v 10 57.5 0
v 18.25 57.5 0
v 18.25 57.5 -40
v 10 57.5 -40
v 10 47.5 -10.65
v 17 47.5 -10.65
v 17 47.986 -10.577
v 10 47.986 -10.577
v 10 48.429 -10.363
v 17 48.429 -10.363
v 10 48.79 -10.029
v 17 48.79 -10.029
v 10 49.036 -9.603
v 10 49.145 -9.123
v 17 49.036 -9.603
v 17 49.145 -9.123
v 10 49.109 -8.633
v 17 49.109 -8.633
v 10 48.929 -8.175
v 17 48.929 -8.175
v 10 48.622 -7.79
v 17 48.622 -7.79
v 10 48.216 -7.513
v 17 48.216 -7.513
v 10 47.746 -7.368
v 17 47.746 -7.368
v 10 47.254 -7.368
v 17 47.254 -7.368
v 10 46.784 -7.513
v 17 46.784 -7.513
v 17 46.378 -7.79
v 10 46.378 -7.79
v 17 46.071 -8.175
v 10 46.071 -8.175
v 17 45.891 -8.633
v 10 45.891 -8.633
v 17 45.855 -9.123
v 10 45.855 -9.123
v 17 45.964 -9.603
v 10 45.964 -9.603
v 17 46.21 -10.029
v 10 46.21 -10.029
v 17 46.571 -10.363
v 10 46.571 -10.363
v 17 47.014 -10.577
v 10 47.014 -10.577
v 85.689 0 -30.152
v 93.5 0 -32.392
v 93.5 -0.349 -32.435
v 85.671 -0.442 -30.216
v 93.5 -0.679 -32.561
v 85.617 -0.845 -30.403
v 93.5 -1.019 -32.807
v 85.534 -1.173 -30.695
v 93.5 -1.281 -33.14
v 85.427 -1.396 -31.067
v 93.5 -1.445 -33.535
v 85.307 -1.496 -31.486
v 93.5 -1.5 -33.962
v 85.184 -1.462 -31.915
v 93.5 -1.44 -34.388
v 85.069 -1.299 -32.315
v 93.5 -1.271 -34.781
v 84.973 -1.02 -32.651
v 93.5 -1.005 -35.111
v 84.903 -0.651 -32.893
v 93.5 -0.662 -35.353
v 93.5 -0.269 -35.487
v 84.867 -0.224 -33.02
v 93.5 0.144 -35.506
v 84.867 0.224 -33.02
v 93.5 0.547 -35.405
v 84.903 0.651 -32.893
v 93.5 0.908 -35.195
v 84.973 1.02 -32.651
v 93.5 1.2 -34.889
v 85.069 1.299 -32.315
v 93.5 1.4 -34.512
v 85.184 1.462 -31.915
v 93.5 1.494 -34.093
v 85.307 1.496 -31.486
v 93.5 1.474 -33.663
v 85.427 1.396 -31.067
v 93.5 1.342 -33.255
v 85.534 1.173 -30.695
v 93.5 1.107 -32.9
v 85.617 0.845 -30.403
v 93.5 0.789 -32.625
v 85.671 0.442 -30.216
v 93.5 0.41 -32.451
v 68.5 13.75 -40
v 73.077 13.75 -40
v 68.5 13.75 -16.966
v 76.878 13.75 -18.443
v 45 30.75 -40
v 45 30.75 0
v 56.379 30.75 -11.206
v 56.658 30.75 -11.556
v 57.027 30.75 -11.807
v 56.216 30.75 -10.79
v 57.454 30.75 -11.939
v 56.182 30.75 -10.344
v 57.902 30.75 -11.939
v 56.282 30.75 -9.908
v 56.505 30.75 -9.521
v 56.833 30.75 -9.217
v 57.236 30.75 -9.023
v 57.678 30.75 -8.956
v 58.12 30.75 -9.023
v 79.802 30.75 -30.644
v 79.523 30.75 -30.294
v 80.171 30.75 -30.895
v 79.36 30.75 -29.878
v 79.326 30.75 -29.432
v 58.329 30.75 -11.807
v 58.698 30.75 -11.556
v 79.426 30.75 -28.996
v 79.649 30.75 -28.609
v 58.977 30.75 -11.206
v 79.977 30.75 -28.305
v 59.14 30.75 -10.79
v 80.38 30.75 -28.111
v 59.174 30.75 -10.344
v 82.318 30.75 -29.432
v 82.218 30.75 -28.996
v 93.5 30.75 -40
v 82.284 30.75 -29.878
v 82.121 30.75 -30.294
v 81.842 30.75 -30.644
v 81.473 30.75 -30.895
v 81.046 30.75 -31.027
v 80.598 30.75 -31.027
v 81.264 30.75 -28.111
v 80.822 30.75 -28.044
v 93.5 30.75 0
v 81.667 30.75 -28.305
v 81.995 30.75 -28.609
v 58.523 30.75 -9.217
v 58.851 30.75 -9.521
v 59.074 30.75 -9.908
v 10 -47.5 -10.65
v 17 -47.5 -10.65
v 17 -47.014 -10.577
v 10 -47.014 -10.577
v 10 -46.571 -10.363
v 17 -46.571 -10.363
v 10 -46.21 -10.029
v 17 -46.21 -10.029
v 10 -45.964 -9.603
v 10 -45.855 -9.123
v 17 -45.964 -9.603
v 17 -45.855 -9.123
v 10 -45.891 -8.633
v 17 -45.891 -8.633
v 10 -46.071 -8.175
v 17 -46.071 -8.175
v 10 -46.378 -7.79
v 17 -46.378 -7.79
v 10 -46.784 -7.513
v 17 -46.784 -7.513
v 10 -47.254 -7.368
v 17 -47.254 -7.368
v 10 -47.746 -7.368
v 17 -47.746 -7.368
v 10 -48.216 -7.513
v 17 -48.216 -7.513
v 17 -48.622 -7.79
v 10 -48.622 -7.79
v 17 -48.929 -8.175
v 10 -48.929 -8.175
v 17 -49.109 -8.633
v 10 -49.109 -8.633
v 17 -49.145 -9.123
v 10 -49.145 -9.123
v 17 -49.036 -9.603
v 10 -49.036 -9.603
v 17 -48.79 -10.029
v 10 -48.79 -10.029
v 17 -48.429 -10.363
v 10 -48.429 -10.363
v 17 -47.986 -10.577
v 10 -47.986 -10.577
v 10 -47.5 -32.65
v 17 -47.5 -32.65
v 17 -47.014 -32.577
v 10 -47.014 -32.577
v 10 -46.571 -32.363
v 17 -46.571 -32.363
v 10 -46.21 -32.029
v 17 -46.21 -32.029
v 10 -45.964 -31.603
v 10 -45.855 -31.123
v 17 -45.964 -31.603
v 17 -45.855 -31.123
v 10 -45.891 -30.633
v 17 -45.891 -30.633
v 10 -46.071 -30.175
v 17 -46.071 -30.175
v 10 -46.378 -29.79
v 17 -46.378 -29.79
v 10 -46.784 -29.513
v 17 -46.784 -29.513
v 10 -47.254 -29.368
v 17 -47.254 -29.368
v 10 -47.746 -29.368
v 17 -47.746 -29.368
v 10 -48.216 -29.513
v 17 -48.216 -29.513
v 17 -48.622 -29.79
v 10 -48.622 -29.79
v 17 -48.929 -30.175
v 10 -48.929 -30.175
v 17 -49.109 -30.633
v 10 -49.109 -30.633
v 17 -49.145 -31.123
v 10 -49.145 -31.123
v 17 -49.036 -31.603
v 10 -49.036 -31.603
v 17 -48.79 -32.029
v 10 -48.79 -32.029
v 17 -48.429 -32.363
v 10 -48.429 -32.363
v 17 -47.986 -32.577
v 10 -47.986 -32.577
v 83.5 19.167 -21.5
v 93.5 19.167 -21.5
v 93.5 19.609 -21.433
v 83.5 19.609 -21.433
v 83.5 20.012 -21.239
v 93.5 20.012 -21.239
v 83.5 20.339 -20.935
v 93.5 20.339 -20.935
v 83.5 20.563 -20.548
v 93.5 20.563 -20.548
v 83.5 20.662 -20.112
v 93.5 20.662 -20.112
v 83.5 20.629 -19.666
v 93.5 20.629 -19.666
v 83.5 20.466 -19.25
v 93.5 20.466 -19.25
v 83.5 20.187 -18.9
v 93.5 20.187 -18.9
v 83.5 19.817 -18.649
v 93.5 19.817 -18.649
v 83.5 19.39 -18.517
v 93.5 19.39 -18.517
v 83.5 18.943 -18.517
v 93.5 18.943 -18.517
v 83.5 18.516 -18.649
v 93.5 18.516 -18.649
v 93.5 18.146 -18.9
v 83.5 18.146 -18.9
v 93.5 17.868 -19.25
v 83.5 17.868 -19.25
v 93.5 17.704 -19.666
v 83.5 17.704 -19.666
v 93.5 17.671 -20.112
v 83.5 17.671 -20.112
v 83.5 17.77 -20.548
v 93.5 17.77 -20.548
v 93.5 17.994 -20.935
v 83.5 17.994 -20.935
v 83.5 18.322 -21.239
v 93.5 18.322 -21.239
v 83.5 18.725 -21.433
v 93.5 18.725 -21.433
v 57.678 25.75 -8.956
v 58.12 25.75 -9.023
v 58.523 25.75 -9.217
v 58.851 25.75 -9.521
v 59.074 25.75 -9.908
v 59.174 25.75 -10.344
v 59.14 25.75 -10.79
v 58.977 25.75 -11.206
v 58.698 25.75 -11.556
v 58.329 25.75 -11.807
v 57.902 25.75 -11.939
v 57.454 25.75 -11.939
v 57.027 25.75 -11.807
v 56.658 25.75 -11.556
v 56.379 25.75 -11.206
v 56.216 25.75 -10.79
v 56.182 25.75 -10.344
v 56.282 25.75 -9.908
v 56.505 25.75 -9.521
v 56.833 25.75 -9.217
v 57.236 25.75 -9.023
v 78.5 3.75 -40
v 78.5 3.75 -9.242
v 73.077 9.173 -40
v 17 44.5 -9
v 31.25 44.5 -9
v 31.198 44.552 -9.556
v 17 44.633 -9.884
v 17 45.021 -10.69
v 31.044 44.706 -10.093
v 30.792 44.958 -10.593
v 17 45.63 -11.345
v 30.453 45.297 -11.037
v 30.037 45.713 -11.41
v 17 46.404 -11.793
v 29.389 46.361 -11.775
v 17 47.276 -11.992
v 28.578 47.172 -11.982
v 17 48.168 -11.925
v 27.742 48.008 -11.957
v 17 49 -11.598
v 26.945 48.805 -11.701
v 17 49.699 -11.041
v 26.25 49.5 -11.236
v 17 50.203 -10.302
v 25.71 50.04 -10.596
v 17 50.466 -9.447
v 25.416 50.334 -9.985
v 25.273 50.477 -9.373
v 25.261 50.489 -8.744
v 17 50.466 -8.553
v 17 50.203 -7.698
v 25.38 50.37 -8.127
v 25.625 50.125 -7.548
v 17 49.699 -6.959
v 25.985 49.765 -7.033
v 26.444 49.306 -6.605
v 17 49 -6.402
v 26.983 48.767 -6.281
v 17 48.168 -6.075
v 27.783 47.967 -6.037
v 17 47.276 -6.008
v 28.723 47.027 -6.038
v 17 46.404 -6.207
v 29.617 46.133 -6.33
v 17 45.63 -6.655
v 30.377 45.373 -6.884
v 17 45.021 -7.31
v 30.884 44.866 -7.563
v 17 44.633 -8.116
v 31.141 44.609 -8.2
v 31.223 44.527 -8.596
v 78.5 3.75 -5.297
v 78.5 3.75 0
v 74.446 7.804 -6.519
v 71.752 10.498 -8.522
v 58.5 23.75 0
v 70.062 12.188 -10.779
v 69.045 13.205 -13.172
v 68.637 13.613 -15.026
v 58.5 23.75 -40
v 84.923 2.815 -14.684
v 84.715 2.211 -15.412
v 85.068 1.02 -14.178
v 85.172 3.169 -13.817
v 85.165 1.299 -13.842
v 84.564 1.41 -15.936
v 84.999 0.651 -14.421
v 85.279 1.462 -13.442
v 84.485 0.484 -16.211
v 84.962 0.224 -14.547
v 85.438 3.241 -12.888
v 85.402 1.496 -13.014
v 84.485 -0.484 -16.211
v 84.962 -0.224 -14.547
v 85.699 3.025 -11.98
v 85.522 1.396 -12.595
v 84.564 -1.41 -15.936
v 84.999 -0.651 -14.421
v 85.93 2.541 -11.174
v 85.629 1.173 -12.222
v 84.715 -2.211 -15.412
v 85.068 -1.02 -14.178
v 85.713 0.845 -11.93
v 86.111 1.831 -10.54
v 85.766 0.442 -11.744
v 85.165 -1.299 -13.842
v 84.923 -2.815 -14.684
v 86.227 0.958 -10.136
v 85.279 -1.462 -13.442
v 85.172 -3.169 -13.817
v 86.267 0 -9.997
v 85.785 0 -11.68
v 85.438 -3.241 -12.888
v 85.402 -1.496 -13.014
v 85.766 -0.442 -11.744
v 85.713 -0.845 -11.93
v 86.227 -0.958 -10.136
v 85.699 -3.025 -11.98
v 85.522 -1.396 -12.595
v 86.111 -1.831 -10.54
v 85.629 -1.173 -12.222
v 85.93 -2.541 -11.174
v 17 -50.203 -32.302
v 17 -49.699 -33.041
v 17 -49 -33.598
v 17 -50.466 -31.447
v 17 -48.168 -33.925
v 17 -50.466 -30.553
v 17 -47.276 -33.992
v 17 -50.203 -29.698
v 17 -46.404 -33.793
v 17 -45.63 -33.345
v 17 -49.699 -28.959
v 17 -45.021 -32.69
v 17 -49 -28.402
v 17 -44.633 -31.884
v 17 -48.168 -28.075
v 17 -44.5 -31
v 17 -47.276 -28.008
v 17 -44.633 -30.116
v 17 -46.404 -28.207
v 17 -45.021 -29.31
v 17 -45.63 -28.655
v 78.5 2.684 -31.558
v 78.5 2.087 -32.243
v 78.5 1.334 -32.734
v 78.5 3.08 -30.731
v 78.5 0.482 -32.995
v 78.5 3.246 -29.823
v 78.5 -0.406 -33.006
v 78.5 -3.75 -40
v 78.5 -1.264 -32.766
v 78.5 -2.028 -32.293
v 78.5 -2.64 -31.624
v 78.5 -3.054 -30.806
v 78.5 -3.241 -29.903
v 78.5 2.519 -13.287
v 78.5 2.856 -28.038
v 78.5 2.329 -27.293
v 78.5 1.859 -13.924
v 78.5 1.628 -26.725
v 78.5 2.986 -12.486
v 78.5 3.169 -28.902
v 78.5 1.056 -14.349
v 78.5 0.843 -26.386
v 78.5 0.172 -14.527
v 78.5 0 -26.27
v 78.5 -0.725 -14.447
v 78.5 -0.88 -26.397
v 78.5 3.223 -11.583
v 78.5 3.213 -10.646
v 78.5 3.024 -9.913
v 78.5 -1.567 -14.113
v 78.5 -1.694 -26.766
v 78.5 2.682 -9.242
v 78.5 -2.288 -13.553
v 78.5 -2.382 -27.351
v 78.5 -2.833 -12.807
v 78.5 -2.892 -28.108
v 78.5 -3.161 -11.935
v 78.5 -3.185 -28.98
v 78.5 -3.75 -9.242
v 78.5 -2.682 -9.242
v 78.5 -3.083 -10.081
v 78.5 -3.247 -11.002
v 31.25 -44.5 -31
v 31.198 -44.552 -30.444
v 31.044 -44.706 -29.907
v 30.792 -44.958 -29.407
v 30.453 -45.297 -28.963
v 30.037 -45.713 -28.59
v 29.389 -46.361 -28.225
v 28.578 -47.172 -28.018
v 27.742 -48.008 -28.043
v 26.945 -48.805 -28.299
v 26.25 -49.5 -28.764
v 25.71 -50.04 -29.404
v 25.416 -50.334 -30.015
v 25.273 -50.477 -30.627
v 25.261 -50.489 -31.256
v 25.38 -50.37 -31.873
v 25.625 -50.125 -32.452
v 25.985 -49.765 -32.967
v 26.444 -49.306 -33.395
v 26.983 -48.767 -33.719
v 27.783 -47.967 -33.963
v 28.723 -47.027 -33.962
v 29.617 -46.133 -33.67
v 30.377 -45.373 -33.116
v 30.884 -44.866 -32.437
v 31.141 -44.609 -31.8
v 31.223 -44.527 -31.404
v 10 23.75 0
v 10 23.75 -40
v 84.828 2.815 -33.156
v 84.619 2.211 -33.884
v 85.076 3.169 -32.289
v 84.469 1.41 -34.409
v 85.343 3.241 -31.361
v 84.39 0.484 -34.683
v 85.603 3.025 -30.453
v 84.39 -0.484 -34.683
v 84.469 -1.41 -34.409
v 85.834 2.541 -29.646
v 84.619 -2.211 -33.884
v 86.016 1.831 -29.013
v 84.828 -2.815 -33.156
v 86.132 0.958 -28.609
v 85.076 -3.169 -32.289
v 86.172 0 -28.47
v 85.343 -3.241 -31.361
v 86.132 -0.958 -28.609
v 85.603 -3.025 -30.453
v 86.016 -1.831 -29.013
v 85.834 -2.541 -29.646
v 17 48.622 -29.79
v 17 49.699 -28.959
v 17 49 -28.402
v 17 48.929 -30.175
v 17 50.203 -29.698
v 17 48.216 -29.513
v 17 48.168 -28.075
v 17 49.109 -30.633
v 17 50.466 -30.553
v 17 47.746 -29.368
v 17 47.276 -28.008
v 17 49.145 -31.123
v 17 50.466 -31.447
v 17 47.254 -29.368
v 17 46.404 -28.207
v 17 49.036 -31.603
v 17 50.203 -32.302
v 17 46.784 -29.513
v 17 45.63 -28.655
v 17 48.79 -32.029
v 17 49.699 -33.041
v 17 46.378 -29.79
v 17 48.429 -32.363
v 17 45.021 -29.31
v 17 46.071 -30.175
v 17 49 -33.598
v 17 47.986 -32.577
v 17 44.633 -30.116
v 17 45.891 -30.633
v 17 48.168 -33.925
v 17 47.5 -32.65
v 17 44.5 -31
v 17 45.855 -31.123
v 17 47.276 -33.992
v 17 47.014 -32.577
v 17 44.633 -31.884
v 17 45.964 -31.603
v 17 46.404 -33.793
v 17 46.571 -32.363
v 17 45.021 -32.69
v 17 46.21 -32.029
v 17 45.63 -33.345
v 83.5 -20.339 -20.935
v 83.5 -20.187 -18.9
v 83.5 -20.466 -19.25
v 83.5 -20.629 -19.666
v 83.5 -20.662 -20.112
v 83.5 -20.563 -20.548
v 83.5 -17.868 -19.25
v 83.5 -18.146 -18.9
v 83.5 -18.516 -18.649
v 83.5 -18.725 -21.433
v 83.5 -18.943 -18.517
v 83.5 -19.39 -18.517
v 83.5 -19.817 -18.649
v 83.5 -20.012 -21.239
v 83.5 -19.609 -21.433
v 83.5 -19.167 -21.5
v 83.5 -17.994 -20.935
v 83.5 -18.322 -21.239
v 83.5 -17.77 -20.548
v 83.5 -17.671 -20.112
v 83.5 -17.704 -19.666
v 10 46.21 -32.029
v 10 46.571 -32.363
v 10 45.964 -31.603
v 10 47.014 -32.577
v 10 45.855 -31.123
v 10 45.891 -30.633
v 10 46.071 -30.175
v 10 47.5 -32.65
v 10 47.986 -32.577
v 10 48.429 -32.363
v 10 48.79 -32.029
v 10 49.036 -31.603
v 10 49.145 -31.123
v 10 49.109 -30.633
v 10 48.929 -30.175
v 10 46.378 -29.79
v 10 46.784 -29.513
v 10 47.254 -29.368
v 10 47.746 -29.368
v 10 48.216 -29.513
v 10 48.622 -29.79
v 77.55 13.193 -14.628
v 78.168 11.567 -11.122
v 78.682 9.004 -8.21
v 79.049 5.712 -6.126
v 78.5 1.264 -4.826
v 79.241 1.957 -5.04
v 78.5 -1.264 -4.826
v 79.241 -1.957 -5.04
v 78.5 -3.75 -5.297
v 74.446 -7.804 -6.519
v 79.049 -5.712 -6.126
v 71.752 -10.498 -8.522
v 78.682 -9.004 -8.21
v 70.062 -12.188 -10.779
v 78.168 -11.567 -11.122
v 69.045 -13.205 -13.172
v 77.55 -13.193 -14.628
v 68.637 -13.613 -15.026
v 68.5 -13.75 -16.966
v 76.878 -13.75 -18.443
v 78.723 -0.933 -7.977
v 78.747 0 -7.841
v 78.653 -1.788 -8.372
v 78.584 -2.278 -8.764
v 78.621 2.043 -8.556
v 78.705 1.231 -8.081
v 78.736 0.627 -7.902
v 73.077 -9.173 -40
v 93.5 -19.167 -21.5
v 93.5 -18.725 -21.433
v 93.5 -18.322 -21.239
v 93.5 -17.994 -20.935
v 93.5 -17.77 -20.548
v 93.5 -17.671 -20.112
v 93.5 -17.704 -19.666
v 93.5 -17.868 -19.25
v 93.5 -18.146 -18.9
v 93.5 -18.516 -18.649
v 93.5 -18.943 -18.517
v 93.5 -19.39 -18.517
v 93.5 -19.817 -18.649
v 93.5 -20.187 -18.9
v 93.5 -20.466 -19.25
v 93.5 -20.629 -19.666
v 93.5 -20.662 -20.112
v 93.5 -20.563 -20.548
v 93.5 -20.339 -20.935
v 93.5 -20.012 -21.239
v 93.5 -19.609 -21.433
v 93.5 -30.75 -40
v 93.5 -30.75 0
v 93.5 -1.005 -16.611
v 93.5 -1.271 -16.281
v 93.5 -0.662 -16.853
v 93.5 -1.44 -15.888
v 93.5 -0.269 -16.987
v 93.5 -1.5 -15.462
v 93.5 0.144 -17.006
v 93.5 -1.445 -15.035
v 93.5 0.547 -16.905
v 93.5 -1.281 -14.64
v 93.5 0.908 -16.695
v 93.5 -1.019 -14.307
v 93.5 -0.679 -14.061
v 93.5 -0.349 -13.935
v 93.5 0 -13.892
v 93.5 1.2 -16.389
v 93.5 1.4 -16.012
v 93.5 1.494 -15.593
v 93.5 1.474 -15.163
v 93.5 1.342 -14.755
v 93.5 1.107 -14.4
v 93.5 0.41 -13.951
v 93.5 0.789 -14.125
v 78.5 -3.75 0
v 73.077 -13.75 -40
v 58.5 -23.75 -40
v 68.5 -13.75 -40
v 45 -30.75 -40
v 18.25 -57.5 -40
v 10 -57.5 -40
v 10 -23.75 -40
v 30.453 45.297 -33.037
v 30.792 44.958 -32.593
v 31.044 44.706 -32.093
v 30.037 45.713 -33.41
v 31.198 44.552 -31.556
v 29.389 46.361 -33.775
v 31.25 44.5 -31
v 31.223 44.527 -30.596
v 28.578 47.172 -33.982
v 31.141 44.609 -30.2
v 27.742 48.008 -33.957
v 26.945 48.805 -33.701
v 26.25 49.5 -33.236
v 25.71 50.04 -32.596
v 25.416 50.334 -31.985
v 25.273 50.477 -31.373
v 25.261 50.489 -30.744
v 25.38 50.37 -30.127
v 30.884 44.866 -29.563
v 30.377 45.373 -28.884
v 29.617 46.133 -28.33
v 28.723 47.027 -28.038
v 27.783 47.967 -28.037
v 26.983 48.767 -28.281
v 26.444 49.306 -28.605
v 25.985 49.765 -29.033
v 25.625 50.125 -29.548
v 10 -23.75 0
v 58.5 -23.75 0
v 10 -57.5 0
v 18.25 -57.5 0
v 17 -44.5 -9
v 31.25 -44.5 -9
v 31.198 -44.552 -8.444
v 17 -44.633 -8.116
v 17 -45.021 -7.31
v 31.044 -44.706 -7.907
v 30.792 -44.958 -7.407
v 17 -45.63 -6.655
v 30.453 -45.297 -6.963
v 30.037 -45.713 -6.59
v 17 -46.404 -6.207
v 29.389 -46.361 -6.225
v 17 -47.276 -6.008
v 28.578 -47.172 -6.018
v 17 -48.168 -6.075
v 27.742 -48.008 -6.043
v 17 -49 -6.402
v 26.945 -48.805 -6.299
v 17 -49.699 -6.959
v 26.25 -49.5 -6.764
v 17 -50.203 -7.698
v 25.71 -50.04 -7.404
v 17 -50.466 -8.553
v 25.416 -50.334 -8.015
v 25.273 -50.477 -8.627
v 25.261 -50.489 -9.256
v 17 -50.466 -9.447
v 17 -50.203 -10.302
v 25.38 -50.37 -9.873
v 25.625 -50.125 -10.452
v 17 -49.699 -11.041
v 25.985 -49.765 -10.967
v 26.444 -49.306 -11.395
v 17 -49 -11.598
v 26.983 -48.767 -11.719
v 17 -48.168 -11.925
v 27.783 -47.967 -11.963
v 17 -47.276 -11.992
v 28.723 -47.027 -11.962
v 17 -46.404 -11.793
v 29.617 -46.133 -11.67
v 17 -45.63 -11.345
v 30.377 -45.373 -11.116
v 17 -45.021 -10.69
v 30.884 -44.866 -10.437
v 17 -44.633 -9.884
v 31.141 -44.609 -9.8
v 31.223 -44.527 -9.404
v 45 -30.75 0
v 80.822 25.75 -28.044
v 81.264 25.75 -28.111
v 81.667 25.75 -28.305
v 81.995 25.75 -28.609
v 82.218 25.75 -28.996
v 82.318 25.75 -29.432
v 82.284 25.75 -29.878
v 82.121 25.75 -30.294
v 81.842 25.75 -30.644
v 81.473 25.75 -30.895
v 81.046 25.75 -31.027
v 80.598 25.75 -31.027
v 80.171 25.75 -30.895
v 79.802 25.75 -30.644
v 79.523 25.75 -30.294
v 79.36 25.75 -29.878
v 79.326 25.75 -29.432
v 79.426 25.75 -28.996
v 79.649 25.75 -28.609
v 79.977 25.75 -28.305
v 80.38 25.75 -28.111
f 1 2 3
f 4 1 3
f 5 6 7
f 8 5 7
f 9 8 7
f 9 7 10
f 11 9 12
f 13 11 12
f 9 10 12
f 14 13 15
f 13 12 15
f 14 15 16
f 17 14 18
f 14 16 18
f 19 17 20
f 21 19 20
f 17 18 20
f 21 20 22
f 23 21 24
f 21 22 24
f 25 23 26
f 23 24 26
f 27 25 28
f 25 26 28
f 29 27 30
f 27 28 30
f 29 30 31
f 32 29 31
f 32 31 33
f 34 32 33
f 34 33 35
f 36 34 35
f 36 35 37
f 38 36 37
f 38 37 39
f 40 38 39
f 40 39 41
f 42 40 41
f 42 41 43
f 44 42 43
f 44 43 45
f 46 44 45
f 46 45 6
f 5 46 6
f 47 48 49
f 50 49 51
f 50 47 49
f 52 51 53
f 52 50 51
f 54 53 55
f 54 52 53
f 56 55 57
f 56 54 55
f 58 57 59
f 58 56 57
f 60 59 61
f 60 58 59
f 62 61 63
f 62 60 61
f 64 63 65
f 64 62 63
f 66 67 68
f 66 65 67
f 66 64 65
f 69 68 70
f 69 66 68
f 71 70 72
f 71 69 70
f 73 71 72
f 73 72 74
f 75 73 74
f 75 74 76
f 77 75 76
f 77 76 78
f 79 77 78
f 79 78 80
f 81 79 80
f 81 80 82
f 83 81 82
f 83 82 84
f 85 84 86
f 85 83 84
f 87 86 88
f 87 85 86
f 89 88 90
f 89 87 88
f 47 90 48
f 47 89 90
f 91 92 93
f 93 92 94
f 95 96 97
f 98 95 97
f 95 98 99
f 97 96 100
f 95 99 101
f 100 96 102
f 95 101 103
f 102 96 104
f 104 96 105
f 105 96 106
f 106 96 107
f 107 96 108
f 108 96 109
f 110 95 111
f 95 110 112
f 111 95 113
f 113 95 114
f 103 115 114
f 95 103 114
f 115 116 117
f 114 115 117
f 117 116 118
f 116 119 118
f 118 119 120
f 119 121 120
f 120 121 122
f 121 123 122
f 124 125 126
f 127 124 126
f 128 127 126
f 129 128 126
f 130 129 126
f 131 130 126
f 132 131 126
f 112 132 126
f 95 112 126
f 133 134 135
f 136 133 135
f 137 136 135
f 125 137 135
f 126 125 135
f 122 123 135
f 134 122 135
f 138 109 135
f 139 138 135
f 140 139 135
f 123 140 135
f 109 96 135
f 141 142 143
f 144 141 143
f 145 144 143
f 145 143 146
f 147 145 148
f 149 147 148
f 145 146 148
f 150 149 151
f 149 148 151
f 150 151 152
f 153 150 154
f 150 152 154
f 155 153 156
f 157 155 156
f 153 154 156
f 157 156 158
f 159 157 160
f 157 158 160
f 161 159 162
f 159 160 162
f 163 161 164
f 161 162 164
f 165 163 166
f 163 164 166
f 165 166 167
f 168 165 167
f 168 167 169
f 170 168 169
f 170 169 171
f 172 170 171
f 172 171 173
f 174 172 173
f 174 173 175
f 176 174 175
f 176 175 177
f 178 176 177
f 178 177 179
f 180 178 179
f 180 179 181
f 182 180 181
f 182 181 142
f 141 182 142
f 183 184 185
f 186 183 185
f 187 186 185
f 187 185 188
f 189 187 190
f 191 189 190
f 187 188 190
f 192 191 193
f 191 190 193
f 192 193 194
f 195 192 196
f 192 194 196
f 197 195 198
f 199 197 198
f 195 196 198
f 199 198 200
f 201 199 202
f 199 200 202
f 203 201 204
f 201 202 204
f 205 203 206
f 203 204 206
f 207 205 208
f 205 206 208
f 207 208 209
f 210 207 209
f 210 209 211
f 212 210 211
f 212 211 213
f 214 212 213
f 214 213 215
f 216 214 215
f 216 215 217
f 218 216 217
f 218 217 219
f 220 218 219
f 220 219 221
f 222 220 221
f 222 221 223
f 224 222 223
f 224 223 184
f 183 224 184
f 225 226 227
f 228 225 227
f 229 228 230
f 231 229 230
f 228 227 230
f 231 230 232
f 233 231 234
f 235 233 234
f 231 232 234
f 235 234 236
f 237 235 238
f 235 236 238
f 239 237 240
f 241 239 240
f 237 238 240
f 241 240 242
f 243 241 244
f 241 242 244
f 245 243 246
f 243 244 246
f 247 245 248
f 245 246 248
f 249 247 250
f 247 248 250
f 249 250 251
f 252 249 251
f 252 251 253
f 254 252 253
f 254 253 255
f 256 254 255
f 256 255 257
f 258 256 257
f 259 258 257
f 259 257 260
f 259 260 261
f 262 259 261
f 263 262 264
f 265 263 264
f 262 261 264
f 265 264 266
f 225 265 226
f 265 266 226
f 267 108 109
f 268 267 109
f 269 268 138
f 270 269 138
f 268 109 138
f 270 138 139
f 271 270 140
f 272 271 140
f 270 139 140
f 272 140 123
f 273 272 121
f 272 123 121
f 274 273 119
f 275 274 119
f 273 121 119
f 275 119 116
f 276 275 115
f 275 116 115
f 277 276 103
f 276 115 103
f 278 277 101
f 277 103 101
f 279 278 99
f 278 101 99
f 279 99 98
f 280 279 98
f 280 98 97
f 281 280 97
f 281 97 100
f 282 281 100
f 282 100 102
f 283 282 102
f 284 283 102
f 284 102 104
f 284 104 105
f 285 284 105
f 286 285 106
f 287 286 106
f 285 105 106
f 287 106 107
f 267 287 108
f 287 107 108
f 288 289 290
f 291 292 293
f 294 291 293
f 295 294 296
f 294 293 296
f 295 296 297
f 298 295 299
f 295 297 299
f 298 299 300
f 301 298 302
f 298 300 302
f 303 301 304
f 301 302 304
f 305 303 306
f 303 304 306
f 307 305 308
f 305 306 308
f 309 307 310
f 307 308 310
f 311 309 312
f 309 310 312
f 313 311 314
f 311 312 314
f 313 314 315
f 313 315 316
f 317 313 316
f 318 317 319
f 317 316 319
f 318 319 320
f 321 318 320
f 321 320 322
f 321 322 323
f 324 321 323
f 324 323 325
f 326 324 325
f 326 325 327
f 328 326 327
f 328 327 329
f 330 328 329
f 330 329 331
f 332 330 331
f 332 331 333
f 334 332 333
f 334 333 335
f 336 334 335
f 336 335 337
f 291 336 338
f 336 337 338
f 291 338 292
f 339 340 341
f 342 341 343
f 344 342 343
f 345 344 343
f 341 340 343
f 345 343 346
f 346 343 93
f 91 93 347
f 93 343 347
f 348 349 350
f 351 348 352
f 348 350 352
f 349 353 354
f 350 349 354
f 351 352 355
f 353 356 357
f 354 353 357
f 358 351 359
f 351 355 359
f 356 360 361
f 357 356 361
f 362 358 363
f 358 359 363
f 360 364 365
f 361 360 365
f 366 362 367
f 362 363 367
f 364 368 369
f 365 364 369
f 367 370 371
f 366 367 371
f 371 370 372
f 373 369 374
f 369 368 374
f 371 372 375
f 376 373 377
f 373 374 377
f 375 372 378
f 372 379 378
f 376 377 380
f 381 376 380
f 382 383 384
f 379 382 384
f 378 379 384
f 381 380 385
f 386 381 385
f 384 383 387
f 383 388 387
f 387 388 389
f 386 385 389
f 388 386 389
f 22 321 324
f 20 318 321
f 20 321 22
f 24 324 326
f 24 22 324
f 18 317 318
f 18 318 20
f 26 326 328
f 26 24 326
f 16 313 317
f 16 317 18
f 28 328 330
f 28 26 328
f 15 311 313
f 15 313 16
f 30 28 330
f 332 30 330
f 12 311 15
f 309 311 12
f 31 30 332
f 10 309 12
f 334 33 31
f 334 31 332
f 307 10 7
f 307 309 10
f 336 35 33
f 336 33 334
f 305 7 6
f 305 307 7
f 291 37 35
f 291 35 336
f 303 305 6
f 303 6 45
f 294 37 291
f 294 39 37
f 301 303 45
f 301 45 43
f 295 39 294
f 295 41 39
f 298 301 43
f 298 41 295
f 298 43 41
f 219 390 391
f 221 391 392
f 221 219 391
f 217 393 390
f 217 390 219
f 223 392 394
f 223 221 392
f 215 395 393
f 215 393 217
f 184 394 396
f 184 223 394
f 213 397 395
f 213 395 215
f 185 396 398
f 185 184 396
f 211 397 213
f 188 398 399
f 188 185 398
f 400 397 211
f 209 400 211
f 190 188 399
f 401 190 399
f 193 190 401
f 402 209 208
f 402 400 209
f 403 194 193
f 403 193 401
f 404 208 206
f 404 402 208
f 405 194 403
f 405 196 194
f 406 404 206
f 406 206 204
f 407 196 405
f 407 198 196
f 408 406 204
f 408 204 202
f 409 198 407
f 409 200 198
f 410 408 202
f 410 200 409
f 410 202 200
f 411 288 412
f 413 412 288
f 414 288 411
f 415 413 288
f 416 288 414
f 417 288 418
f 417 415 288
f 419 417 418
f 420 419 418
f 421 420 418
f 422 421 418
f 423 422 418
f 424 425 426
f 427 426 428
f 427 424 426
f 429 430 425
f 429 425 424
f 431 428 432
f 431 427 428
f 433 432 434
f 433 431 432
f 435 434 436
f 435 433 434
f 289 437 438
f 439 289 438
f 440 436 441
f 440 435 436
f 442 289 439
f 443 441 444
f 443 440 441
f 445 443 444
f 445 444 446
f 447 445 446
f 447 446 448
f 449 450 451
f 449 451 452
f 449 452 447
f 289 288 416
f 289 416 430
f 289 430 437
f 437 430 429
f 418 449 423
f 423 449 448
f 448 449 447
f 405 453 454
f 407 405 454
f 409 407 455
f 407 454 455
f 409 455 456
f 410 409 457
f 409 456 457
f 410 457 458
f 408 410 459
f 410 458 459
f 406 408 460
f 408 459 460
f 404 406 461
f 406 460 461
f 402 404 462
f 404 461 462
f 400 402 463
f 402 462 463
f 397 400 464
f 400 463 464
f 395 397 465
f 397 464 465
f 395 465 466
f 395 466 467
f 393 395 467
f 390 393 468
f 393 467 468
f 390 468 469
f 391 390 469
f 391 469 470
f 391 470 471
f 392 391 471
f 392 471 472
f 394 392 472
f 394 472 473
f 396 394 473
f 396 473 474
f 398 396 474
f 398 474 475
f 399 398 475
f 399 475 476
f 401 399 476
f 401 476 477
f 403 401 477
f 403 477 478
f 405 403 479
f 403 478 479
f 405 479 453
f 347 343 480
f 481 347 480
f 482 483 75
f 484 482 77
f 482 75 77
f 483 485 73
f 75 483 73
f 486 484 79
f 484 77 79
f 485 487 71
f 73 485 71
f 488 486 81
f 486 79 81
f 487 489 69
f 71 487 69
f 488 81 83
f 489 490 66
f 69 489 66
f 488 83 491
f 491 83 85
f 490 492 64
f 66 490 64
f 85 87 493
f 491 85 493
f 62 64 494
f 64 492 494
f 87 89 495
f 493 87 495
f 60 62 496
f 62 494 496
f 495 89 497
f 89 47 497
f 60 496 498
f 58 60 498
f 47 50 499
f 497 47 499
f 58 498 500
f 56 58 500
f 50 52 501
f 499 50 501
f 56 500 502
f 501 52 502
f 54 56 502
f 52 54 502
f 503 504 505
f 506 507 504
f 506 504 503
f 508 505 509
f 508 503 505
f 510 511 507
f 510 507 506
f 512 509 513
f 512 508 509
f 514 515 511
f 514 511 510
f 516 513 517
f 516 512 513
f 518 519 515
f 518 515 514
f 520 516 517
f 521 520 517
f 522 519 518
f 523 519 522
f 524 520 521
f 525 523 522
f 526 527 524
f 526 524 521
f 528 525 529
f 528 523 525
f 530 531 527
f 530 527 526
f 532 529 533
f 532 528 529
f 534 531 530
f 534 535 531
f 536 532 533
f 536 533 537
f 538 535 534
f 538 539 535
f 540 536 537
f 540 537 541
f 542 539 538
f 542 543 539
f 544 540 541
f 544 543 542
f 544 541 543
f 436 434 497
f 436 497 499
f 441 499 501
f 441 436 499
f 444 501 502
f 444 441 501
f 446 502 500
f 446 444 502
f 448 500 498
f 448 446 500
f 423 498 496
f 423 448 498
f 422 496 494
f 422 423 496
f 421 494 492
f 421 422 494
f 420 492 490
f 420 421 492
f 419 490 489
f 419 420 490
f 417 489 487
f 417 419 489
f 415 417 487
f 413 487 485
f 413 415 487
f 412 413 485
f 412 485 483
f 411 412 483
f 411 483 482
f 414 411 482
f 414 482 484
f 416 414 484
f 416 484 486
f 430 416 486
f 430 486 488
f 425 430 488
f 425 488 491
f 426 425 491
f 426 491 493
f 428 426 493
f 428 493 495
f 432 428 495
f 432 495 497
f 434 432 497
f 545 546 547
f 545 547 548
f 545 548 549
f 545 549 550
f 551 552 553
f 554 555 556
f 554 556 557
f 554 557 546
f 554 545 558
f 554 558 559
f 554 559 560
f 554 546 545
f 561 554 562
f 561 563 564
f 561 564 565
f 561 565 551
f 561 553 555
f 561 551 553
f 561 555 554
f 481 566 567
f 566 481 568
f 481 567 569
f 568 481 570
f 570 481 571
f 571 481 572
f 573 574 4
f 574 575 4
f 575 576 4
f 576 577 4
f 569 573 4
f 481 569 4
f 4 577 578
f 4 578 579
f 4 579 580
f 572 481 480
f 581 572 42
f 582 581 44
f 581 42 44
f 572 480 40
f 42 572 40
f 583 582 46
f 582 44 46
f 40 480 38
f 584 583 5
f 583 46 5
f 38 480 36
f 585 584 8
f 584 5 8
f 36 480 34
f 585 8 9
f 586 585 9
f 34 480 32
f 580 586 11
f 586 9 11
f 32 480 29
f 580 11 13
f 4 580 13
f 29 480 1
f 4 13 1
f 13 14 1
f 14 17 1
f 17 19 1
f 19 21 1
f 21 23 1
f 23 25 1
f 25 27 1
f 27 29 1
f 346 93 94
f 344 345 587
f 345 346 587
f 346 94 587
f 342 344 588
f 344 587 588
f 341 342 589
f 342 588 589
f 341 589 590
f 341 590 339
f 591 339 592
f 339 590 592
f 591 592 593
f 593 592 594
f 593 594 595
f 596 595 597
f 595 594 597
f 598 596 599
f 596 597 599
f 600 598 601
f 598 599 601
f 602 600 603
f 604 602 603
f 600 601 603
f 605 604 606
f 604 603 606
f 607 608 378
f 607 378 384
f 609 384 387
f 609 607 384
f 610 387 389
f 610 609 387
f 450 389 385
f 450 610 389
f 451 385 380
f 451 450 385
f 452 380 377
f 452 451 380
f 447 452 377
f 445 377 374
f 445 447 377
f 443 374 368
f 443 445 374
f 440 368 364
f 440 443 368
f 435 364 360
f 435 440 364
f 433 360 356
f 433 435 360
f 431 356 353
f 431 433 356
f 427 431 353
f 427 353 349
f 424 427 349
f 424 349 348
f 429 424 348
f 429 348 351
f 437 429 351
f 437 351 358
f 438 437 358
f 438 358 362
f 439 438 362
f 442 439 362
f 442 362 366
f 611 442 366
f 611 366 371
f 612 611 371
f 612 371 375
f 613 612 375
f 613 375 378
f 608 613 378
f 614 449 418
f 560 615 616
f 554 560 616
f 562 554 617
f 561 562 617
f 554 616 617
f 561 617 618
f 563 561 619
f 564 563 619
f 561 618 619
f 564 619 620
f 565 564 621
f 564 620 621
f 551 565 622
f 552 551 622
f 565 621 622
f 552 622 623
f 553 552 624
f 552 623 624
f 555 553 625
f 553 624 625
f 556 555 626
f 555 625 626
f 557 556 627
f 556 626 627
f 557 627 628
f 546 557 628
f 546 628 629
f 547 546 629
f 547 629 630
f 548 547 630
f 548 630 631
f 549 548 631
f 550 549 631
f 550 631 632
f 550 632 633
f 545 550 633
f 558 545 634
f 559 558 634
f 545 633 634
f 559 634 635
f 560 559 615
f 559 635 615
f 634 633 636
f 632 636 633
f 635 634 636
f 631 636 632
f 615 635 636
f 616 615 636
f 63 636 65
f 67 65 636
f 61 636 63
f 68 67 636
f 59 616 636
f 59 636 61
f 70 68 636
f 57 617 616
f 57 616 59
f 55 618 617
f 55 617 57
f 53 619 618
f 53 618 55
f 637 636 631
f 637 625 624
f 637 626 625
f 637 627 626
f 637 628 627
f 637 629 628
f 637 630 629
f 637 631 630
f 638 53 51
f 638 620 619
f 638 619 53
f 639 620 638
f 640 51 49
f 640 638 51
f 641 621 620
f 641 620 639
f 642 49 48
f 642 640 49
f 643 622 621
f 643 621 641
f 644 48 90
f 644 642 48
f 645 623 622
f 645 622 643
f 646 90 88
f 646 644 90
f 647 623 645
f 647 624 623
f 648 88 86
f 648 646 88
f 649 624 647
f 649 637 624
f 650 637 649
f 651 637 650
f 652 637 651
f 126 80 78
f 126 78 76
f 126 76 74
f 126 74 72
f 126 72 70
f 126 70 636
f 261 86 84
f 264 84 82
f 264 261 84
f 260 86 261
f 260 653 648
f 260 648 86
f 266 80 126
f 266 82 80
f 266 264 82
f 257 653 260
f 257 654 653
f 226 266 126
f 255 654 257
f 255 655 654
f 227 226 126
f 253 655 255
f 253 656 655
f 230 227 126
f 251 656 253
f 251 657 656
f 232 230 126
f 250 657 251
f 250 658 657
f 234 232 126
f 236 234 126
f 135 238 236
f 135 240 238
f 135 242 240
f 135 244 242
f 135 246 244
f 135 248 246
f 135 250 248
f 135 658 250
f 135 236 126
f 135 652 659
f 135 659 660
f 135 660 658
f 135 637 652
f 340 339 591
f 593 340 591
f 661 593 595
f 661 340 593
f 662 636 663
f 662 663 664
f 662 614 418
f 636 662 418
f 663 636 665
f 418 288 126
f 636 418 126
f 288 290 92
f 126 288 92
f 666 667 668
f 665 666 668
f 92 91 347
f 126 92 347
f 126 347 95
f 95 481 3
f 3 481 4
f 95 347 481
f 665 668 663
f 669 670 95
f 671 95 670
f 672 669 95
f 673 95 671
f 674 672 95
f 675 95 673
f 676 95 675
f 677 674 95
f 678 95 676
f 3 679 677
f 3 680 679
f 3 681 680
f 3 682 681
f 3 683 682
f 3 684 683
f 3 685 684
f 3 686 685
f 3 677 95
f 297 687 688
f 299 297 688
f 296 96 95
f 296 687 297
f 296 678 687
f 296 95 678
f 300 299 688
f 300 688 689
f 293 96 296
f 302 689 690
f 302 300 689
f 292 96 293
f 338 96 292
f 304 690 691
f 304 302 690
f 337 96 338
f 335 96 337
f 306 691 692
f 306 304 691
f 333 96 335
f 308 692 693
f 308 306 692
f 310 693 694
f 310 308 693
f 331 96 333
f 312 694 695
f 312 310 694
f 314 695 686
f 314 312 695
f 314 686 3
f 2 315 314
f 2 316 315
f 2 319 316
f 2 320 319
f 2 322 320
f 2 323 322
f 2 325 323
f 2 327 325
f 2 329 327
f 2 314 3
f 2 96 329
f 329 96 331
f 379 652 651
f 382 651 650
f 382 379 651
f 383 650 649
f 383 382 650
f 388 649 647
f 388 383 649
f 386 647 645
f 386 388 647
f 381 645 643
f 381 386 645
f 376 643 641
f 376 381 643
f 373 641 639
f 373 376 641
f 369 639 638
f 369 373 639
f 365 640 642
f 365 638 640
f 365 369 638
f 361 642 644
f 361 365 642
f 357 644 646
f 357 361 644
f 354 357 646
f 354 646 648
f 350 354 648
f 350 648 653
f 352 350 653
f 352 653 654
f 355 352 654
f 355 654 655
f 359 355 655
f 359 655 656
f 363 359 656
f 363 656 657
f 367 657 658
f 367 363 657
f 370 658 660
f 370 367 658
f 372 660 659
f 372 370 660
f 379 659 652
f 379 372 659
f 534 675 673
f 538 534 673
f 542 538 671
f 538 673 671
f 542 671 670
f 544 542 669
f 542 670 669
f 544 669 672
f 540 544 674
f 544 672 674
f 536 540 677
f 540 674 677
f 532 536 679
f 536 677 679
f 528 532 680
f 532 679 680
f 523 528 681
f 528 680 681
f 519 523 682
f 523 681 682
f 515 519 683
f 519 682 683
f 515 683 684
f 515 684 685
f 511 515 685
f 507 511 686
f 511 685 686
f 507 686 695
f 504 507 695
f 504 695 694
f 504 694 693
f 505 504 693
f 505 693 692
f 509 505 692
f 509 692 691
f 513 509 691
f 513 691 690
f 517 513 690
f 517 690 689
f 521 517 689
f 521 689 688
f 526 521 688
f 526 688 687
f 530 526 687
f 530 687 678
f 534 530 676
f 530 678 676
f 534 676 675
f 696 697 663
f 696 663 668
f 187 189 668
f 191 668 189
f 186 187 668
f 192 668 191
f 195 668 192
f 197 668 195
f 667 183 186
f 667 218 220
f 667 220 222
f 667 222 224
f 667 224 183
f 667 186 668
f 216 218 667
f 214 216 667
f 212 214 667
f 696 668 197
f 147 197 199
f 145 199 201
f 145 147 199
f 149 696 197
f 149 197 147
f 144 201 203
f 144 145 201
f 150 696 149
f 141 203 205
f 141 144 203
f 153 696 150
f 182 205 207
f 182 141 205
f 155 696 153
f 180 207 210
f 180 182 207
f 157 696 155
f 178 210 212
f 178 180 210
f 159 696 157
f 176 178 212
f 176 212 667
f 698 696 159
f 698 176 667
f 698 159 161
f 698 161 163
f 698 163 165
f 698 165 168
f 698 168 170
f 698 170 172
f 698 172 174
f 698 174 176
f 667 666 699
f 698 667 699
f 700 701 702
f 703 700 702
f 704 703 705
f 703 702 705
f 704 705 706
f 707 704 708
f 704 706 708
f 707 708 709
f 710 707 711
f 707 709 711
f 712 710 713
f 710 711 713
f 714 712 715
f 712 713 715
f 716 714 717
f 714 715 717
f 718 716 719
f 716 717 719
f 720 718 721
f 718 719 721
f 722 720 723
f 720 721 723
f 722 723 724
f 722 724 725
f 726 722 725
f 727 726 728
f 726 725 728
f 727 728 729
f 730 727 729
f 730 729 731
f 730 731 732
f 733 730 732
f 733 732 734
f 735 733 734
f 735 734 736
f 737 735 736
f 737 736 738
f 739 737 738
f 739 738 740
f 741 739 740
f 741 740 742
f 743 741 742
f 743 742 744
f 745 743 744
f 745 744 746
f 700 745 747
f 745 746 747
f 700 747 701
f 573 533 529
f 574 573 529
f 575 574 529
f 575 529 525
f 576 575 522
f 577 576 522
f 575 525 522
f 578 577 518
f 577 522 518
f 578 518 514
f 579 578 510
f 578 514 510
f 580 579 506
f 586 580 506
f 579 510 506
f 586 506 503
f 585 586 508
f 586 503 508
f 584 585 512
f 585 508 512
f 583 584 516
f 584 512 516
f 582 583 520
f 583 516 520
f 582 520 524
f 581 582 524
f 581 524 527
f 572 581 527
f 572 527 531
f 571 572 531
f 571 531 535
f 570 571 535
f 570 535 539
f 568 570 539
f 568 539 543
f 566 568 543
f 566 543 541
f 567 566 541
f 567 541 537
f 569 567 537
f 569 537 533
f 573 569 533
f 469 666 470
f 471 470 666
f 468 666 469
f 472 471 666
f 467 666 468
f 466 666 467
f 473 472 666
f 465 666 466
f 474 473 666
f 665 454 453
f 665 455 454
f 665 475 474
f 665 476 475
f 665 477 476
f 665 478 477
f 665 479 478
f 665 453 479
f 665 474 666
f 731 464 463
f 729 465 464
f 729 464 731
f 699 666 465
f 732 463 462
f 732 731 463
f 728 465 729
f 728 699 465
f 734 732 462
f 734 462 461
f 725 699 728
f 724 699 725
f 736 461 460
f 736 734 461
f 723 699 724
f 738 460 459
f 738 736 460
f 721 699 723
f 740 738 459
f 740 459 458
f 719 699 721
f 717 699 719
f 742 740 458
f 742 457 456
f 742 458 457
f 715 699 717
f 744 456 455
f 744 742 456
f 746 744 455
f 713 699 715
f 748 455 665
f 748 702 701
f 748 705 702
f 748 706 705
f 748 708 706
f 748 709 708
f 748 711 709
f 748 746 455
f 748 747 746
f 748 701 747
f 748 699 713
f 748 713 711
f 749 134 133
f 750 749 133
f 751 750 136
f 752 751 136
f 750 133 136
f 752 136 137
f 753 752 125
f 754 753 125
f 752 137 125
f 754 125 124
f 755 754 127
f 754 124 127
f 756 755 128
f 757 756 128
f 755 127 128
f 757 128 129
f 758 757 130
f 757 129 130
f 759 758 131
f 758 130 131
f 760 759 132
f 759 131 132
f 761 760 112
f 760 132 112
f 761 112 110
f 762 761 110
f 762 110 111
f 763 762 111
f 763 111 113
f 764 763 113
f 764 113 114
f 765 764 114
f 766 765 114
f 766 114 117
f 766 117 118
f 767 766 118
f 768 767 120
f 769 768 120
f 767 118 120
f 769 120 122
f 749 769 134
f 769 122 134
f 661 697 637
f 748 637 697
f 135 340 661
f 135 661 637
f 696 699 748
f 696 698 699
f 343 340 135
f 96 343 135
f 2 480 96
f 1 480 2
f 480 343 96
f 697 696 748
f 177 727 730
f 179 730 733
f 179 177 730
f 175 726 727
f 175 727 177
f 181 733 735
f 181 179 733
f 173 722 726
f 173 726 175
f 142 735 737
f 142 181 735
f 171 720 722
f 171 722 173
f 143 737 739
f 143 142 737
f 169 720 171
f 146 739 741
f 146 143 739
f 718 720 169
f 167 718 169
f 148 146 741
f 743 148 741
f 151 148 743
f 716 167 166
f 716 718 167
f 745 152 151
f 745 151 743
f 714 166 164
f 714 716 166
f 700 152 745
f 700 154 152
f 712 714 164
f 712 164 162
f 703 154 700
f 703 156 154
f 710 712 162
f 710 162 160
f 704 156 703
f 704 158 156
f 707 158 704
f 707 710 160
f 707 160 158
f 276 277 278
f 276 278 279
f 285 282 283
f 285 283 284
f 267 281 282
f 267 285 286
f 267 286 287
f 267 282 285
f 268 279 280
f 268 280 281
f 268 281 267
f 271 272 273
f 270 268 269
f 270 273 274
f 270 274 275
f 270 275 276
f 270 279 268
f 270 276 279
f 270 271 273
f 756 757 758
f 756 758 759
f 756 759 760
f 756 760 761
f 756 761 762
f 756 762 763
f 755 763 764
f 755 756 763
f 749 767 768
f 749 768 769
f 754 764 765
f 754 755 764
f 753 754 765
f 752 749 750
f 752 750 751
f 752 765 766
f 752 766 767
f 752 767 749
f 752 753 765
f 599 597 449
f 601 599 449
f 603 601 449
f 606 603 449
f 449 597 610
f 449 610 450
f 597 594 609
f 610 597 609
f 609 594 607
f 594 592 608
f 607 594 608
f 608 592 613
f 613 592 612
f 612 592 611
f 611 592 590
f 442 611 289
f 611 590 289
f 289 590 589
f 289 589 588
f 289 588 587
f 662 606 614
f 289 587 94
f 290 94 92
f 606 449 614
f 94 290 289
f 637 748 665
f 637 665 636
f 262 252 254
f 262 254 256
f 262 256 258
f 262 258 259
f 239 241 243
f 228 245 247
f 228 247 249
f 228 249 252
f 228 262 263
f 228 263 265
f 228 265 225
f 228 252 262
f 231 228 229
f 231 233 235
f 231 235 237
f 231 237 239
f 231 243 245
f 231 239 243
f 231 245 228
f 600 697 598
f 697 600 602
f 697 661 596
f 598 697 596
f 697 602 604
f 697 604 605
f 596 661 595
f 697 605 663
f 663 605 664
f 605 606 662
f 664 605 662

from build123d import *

# Parameters (mm, degrees)
BOSS_EXTRUDE1_DEPTH = 40
CHAMFER1_SIZE       = 20
CHAMFER2_SIZE       = 30
SKETCH2_R           = 3.25
CUT_EXTRUDE1_DEPTH  = 32
CUT_EXTRUDE5_START  = 5
SKETCH2_3_R         = 3.25
CUT_EXTRUDE5_DEPTH  = 32
SKETCH5_R           = 1.65
CUT_EXTRUDE2_DEPTH  = 109.988531507
SKETCH6_R           = 3
CUT_EXTRUDE3_DEPTH  = 76.5
SKETCH7_R           = 1.5
CUT_EXTRUDE4_DEPTH  = 10
SKETCH8_R           = 1.5
CUT_EXTRUDE6_DEPTH  = 76.478231012
CUT_EXTRUDE7_DEPTH  = 93.643917135
SKETCH10_R          = 1.5
CUT_EXTRUDE8_DEPTH  = 5


with BuildPart() as part:
    # Sketch1 → Boss-Extrude1 (new body)
    with BuildSketch(Plane.XY):
        Polygon((10, 57.5), (15, 57.5), (15, 30.75), (93.5, 30.75), (93.5, 0), (78.5, 0), (78.5, 23.75), (10, 23.75), align=None)
    boss_extrude1 = extrude(amount=-BOSS_EXTRUDE1_DEPTH)

    # Mirror1: Boss-Extrude1 across plane
    add(boss_extrude1.mirror(Plane(origin=(78.5, 0, -40), x_dir=(0, 0, 1), z_dir=(0, -1, 0))))

    # Chamfer1
    chamfer1_edges = [part.edges().sort_by_distance(p)[0] for p in [
        (78.5, 23.75, -20),
        (78.5, -23.75, -20),
    ]]
    chamfer(chamfer1_edges, length=CHAMFER1_SIZE)

    # Chamfer2
    # the kernel refuses this chamfer: 30 mm, written as the material it adds along each edge
    with BuildSketch(Plane(origin=(15, 30.75, 0), x_dir=(0.9996219169112968, -0.02749587661058632, 0), z_dir=(0, 0, -1))) as chamfer2_piece_1_section:
        Polygon((CHAMFER2_SIZE * 0.999621916911, -CHAMFER2_SIZE * 0.0274958766106), (-CHAMFER2_SIZE * 0.0274958766106, -CHAMFER2_SIZE * 0.999621916911), (0, 0), align=None)
    chamfer2_piece_1 = extrude(amount=40, mode=Mode.PRIVATE)
    chamfer2_piece_1 = split(chamfer2_piece_1, bisect_by=Plane(origin=(25.097042378, 57.5, -20), z_dir=(0, -1, 0)), keep=Keep.TOP, mode=Mode.PRIVATE)
    add(chamfer2_piece_1)
    with BuildSketch(Plane(origin=(15, -30.75, 0), x_dir=(-0.02749587661058655, -0.9996219169112968, 0), z_dir=(0, 0, -1))) as chamfer2_piece_2_section:
        Polygon((CHAMFER2_SIZE * 0.999621916911, -CHAMFER2_SIZE * 0.0274958766106), (-CHAMFER2_SIZE * 0.0274958766106, -CHAMFER2_SIZE * 0.999621916911), (0, 0), align=None)
    chamfer2_piece_2 = extrude(amount=40, mode=Mode.PRIVATE)
    chamfer2_piece_2 = split(chamfer2_piece_2, bisect_by=Plane(origin=(25.097042378, -57.5, -20), z_dir=(0, 1, 0)), keep=Keep.TOP, mode=Mode.PRIVATE)
    add(chamfer2_piece_2)

    # Sketch2 → Cut-Extrude1 (cut)
    with BuildSketch(Plane(origin=(51.601375419, 0, -14.7964563), x_dir=(0, -1, 0), z_dir=(0.9612616959383188, 0, -0.27563735581699983))):
        with Locations(Location((0, -10.918329477, 0), (0, 0, 270))):
            Circle(SKETCH2_R)
    extrude(amount=CUT_EXTRUDE1_DEPTH, mode=Mode.SUBTRACT)

    # Sketch2<3> → Cut-Extrude5 (cut)
    with BuildSketch(Plane(origin=(51.601375419, 0, -14.7964563), x_dir=(0, -1, 0), z_dir=(0.9612616959383188, 0, -0.27563735581699983)).offset(CUT_EXTRUDE5_START)):
        with Locations(Location((0, 6.865011898, 0), (0, 0, 270))):
            Circle(SKETCH2_3_R)
    extrude(amount=CUT_EXTRUDE5_DEPTH, mode=Mode.SUBTRACT)

    # Sketch5 → Cut-Extrude2 (cut, through all)
    with BuildSketch(Plane(origin=(93.5, 0, 0), x_dir=(0, 0, -1), z_dir=(1, 0, 0))):
        with Locations((31, -47.5)):
            Circle(SKETCH5_R)
        with Locations((9, -47.5)):
            Circle(SKETCH5_R)
        with Locations((9, 47.5)):
            Circle(SKETCH5_R)
        with Locations((31, 47.5)):
            Circle(SKETCH5_R)
    extrude(amount=-CUT_EXTRUDE2_DEPTH, mode=Mode.SUBTRACT)

    # Sketch6 → Cut-Extrude3 (cut)
    with BuildSketch(Plane(origin=(93.5, 0, 0), x_dir=(0, 0, -1), z_dir=(1, 0, 0))):
        with Locations(Location((31, -47.5, 0), (0, 0, 90))):
            Circle(SKETCH6_R)
        with Locations(Location((9, -47.5, 0), (0, 0, 90))):
            Circle(SKETCH6_R)
        with Locations(Location((31, 47.5, 0), (0, 0, 270))):
            Circle(SKETCH6_R)
        with Locations(Location((9, 47.5, 0), (0, 0, 270))):
            Circle(SKETCH6_R)
    extrude(amount=-CUT_EXTRUDE3_DEPTH, mode=Mode.SUBTRACT)

    # Sketch7 → Cut-Extrude4 (cut)
    with BuildSketch(Plane(origin=(93.5, 0, 0), x_dir=(0, 0, -1), z_dir=(1, 0, 0))):
        with Locations((20, -19.166666667)):
            Circle(SKETCH7_R)
        with Locations((20, 19.166666667)):
            Circle(SKETCH7_R)
    extrude(amount=-CUT_EXTRUDE4_DEPTH, mode=Mode.SUBTRACT)

    # Sketch8 → Cut-Extrude6 (cut, through all)
    with BuildSketch(Plane(origin=(51.601375419, 0, -14.7964563), x_dir=(0, -1, 0), z_dir=(0.9612616959383188, 0, -0.27563735581699983))):
        with Locations(Location((0, -10.918329477, 0), (0, 0, 270))):
            Circle(SKETCH8_R)
        with Locations(Location((0, 6.865011898, 0), (0, 0, 270))):
            Circle(SKETCH8_R)
    extrude(amount=CUT_EXTRUDE6_DEPTH, mode=Mode.SUBTRACT)

    # Sketch9 → Cut-Extrude7 (cut, through all)
    with BuildSketch(Plane(origin=(77.713455589, 0, -13.702978984), x_dir=(-0.17364817766693075, 0, -0.9848077530122081), z_dir=(0.9848077530122081, 0, -0.17364817766693075))):
        with BuildLine():
            Line((4.81351977, -13.75), (14.81351977, -13.75))
            Line((14.81351977, -13.75), (30.80281724, -13.75))
            Line((30.80281724, -13.75), (30.80281724, 13.75))
            Line((30.80281724, 13.75), (6.250897221, 13.75))
            Line((6.250897221, 13.75), (4.81351977, 13.75))
            ThreePointArc((4.81351977, 13.75), (-8.93648023, 0), (4.81351977, -13.75))
        make_face()
    extrude(amount=-CUT_EXTRUDE7_DEPTH, mode=Mode.SUBTRACT)

    # Sketch10 → Cut-Extrude8 (cut)
    with BuildSketch(Plane(origin=(0, 30.75, 0), x_dir=(1, 0, 0), z_dir=(0, 1, 0))):
        with Locations(Location((80.822063113, 29.543969578, 0), (0, 0, 270))):
            Circle(SKETCH10_R)
        with Locations(Location((57.677936887, 10.456030422, 0), (0, 0, 270))):
            Circle(SKETCH10_R)
    extrude(amount=-CUT_EXTRUDE8_DEPTH, mode=Mode.SUBTRACT)


solid = part.part
